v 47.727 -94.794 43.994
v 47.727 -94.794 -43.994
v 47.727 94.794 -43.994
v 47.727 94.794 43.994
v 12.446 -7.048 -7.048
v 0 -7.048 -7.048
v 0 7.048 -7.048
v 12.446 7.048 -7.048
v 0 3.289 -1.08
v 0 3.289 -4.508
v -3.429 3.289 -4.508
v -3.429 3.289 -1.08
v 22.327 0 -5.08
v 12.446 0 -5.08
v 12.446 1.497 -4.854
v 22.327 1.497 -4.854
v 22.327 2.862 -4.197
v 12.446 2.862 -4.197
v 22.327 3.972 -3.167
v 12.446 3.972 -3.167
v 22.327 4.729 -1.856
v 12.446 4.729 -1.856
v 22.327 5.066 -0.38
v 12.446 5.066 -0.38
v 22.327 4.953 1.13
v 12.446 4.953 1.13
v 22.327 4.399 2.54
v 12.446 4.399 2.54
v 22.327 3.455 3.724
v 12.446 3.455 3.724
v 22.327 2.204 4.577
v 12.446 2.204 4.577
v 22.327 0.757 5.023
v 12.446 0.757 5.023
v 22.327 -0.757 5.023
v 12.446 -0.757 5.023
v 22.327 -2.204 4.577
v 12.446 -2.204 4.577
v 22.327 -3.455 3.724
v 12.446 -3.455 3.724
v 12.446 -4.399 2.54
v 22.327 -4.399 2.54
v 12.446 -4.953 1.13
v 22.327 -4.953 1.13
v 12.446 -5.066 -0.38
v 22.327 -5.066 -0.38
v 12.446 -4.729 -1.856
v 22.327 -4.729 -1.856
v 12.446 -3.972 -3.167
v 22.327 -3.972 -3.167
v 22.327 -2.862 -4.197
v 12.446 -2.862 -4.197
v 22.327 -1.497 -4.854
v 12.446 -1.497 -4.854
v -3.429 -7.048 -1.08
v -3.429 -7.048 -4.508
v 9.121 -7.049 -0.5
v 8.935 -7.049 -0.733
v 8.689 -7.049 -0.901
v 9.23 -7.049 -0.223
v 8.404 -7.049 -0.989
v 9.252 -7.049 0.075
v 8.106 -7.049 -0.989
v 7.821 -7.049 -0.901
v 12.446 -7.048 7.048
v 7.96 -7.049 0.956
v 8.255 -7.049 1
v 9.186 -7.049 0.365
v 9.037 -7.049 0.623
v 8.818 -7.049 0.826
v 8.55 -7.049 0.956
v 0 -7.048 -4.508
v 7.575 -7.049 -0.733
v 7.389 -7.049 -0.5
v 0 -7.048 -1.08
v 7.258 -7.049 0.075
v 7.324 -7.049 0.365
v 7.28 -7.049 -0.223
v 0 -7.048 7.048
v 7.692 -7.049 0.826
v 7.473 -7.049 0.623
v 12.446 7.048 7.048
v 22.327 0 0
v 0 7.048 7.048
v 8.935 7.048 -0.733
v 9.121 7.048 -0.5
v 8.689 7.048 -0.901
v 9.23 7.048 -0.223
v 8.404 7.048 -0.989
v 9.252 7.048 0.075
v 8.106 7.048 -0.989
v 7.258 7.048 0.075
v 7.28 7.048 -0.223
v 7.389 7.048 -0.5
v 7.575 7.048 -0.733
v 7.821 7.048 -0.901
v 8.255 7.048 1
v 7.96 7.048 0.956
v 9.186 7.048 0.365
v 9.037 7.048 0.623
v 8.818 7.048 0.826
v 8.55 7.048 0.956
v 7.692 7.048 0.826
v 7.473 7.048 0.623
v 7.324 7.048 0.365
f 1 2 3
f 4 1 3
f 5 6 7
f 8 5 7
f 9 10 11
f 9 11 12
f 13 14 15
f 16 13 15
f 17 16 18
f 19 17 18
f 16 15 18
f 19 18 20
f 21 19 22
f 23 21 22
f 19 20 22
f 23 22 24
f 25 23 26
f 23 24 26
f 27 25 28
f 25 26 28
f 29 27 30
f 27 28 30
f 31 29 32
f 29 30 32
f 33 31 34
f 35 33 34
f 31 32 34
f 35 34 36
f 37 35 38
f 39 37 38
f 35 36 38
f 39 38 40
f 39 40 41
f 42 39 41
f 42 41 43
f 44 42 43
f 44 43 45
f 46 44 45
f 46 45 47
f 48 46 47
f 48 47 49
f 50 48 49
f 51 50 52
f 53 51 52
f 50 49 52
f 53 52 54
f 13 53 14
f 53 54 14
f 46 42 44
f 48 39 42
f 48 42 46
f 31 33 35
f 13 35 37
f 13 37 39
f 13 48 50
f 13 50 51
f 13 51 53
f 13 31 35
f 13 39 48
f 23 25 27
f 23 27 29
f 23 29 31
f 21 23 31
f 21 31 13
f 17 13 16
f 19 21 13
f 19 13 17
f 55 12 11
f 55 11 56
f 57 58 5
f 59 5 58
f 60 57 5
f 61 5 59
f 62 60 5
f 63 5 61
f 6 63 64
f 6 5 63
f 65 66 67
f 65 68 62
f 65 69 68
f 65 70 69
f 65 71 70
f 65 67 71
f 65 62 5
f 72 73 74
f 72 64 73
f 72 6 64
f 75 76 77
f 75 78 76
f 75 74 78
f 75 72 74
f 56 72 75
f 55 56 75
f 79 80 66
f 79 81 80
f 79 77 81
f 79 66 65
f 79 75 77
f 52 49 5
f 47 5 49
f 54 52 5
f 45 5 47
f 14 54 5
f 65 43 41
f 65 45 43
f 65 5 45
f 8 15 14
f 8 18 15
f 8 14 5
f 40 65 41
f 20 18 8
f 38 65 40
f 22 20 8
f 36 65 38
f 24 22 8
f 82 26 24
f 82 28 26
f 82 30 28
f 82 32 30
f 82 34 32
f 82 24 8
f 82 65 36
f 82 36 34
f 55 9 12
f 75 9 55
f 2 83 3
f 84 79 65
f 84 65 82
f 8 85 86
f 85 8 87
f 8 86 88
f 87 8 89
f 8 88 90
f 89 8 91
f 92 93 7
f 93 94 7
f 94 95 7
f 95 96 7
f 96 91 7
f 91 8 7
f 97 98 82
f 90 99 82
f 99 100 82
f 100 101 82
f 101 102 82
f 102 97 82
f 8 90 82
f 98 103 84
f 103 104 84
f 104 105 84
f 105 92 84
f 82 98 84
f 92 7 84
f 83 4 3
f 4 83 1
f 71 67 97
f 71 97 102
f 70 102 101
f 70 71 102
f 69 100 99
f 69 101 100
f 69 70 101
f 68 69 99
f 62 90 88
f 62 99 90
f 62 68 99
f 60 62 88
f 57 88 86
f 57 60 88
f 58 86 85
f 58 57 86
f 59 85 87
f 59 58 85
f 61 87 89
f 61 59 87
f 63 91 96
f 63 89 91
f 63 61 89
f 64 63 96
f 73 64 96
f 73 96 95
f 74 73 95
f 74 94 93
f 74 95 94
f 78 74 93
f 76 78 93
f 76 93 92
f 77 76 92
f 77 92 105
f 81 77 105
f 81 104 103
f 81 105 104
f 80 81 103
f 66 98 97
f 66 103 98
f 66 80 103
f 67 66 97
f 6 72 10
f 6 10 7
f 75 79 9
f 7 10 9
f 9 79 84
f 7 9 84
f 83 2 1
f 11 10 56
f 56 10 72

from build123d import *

# Parameters (mm, degrees)
SKETCH1_W               = 14.097
SKETCH1_H               = 14.097
BOSS_EXTRUDE1_DEPTH     = 12.446
SKETCH2_R               = 5.08
BOSS_EXTRUDE2_DEPTH     = 9.8806
CUT_EXTRUDE1_DEPTH      = 25.450762198
CUT_EXTRUDE1_DEPTH_BACK = 25.450762198
SKETCH3_R               = 1
SKETCH4_W               = 10.3378
SKETCH4_H               = 3.429
BOSS_EXTRUDE3_DEPTH     = 3.429


with BuildPart() as part:
    # Sketch1 → Boss-Extrude1 (new body)
    with BuildSketch(Plane.YZ):
        Rectangle(SKETCH1_W, SKETCH1_H)
    extrude(amount=BOSS_EXTRUDE1_DEPTH)

    # Sketch2 → Boss-Extrude2 (add)
    with BuildSketch(Plane.YZ.offset(12.446)):
        with Locations(Location((0, 0, 0), (0, 0, 270))):
            Circle(SKETCH2_R)
    extrude(amount=BOSS_EXTRUDE2_DEPTH)

    # Sketch3 → Cut-Extrude1 (cut, two sides: drawn at the far end of the back side and taken through both)
    with BuildSketch(Plane(origin=(0, 0, 0), x_dir=(-1, 0, 0), z_dir=(0, 1, 0)).offset(-CUT_EXTRUDE1_DEPTH_BACK)):
        with Locations(Location((-8.255, 0, 0), (0, 0, 90))):
            Circle(SKETCH3_R)
    extrude(amount=CUT_EXTRUDE1_DEPTH + CUT_EXTRUDE1_DEPTH_BACK, mode=Mode.SUBTRACT)

    # Sketch4 → Boss-Extrude3 (add)
    with BuildSketch(Plane(origin=(0, 0, 0), x_dir=(0, -1, 0), z_dir=(-1, 0, 0))):
        with Locations((1.8796, -2.794)):
            Rectangle(SKETCH4_W, SKETCH4_H)
    extrude(amount=BOSS_EXTRUDE3_DEPTH)


with BuildPart() as body_2:
    # Sketch8 → FOV section 0
    with BuildSketch(Plane(origin=(47.7266, 0, 0), x_dir=(0, 0, -1), z_dir=(1, 0, 0)), mode=Mode.PRIVATE) as fov_s0:
        with BuildLine():
            Line((43.994090512, -94.794090512), (-43.994090512, -94.794090512))
            Line((-43.994090512, -94.794090512), (-43.994090512, 94.794090512))
            Line((-43.994090512, 94.794090512), (43.994090512, 94.794090512))
            Line((43.994090512, 94.794090512), (43.994090512, -94.794090512))
        make_face()
    loft([fov_s0.sketch, Vertex(22.3266, 0, 0)])


solid = Compound([part.part, body_2.part])
